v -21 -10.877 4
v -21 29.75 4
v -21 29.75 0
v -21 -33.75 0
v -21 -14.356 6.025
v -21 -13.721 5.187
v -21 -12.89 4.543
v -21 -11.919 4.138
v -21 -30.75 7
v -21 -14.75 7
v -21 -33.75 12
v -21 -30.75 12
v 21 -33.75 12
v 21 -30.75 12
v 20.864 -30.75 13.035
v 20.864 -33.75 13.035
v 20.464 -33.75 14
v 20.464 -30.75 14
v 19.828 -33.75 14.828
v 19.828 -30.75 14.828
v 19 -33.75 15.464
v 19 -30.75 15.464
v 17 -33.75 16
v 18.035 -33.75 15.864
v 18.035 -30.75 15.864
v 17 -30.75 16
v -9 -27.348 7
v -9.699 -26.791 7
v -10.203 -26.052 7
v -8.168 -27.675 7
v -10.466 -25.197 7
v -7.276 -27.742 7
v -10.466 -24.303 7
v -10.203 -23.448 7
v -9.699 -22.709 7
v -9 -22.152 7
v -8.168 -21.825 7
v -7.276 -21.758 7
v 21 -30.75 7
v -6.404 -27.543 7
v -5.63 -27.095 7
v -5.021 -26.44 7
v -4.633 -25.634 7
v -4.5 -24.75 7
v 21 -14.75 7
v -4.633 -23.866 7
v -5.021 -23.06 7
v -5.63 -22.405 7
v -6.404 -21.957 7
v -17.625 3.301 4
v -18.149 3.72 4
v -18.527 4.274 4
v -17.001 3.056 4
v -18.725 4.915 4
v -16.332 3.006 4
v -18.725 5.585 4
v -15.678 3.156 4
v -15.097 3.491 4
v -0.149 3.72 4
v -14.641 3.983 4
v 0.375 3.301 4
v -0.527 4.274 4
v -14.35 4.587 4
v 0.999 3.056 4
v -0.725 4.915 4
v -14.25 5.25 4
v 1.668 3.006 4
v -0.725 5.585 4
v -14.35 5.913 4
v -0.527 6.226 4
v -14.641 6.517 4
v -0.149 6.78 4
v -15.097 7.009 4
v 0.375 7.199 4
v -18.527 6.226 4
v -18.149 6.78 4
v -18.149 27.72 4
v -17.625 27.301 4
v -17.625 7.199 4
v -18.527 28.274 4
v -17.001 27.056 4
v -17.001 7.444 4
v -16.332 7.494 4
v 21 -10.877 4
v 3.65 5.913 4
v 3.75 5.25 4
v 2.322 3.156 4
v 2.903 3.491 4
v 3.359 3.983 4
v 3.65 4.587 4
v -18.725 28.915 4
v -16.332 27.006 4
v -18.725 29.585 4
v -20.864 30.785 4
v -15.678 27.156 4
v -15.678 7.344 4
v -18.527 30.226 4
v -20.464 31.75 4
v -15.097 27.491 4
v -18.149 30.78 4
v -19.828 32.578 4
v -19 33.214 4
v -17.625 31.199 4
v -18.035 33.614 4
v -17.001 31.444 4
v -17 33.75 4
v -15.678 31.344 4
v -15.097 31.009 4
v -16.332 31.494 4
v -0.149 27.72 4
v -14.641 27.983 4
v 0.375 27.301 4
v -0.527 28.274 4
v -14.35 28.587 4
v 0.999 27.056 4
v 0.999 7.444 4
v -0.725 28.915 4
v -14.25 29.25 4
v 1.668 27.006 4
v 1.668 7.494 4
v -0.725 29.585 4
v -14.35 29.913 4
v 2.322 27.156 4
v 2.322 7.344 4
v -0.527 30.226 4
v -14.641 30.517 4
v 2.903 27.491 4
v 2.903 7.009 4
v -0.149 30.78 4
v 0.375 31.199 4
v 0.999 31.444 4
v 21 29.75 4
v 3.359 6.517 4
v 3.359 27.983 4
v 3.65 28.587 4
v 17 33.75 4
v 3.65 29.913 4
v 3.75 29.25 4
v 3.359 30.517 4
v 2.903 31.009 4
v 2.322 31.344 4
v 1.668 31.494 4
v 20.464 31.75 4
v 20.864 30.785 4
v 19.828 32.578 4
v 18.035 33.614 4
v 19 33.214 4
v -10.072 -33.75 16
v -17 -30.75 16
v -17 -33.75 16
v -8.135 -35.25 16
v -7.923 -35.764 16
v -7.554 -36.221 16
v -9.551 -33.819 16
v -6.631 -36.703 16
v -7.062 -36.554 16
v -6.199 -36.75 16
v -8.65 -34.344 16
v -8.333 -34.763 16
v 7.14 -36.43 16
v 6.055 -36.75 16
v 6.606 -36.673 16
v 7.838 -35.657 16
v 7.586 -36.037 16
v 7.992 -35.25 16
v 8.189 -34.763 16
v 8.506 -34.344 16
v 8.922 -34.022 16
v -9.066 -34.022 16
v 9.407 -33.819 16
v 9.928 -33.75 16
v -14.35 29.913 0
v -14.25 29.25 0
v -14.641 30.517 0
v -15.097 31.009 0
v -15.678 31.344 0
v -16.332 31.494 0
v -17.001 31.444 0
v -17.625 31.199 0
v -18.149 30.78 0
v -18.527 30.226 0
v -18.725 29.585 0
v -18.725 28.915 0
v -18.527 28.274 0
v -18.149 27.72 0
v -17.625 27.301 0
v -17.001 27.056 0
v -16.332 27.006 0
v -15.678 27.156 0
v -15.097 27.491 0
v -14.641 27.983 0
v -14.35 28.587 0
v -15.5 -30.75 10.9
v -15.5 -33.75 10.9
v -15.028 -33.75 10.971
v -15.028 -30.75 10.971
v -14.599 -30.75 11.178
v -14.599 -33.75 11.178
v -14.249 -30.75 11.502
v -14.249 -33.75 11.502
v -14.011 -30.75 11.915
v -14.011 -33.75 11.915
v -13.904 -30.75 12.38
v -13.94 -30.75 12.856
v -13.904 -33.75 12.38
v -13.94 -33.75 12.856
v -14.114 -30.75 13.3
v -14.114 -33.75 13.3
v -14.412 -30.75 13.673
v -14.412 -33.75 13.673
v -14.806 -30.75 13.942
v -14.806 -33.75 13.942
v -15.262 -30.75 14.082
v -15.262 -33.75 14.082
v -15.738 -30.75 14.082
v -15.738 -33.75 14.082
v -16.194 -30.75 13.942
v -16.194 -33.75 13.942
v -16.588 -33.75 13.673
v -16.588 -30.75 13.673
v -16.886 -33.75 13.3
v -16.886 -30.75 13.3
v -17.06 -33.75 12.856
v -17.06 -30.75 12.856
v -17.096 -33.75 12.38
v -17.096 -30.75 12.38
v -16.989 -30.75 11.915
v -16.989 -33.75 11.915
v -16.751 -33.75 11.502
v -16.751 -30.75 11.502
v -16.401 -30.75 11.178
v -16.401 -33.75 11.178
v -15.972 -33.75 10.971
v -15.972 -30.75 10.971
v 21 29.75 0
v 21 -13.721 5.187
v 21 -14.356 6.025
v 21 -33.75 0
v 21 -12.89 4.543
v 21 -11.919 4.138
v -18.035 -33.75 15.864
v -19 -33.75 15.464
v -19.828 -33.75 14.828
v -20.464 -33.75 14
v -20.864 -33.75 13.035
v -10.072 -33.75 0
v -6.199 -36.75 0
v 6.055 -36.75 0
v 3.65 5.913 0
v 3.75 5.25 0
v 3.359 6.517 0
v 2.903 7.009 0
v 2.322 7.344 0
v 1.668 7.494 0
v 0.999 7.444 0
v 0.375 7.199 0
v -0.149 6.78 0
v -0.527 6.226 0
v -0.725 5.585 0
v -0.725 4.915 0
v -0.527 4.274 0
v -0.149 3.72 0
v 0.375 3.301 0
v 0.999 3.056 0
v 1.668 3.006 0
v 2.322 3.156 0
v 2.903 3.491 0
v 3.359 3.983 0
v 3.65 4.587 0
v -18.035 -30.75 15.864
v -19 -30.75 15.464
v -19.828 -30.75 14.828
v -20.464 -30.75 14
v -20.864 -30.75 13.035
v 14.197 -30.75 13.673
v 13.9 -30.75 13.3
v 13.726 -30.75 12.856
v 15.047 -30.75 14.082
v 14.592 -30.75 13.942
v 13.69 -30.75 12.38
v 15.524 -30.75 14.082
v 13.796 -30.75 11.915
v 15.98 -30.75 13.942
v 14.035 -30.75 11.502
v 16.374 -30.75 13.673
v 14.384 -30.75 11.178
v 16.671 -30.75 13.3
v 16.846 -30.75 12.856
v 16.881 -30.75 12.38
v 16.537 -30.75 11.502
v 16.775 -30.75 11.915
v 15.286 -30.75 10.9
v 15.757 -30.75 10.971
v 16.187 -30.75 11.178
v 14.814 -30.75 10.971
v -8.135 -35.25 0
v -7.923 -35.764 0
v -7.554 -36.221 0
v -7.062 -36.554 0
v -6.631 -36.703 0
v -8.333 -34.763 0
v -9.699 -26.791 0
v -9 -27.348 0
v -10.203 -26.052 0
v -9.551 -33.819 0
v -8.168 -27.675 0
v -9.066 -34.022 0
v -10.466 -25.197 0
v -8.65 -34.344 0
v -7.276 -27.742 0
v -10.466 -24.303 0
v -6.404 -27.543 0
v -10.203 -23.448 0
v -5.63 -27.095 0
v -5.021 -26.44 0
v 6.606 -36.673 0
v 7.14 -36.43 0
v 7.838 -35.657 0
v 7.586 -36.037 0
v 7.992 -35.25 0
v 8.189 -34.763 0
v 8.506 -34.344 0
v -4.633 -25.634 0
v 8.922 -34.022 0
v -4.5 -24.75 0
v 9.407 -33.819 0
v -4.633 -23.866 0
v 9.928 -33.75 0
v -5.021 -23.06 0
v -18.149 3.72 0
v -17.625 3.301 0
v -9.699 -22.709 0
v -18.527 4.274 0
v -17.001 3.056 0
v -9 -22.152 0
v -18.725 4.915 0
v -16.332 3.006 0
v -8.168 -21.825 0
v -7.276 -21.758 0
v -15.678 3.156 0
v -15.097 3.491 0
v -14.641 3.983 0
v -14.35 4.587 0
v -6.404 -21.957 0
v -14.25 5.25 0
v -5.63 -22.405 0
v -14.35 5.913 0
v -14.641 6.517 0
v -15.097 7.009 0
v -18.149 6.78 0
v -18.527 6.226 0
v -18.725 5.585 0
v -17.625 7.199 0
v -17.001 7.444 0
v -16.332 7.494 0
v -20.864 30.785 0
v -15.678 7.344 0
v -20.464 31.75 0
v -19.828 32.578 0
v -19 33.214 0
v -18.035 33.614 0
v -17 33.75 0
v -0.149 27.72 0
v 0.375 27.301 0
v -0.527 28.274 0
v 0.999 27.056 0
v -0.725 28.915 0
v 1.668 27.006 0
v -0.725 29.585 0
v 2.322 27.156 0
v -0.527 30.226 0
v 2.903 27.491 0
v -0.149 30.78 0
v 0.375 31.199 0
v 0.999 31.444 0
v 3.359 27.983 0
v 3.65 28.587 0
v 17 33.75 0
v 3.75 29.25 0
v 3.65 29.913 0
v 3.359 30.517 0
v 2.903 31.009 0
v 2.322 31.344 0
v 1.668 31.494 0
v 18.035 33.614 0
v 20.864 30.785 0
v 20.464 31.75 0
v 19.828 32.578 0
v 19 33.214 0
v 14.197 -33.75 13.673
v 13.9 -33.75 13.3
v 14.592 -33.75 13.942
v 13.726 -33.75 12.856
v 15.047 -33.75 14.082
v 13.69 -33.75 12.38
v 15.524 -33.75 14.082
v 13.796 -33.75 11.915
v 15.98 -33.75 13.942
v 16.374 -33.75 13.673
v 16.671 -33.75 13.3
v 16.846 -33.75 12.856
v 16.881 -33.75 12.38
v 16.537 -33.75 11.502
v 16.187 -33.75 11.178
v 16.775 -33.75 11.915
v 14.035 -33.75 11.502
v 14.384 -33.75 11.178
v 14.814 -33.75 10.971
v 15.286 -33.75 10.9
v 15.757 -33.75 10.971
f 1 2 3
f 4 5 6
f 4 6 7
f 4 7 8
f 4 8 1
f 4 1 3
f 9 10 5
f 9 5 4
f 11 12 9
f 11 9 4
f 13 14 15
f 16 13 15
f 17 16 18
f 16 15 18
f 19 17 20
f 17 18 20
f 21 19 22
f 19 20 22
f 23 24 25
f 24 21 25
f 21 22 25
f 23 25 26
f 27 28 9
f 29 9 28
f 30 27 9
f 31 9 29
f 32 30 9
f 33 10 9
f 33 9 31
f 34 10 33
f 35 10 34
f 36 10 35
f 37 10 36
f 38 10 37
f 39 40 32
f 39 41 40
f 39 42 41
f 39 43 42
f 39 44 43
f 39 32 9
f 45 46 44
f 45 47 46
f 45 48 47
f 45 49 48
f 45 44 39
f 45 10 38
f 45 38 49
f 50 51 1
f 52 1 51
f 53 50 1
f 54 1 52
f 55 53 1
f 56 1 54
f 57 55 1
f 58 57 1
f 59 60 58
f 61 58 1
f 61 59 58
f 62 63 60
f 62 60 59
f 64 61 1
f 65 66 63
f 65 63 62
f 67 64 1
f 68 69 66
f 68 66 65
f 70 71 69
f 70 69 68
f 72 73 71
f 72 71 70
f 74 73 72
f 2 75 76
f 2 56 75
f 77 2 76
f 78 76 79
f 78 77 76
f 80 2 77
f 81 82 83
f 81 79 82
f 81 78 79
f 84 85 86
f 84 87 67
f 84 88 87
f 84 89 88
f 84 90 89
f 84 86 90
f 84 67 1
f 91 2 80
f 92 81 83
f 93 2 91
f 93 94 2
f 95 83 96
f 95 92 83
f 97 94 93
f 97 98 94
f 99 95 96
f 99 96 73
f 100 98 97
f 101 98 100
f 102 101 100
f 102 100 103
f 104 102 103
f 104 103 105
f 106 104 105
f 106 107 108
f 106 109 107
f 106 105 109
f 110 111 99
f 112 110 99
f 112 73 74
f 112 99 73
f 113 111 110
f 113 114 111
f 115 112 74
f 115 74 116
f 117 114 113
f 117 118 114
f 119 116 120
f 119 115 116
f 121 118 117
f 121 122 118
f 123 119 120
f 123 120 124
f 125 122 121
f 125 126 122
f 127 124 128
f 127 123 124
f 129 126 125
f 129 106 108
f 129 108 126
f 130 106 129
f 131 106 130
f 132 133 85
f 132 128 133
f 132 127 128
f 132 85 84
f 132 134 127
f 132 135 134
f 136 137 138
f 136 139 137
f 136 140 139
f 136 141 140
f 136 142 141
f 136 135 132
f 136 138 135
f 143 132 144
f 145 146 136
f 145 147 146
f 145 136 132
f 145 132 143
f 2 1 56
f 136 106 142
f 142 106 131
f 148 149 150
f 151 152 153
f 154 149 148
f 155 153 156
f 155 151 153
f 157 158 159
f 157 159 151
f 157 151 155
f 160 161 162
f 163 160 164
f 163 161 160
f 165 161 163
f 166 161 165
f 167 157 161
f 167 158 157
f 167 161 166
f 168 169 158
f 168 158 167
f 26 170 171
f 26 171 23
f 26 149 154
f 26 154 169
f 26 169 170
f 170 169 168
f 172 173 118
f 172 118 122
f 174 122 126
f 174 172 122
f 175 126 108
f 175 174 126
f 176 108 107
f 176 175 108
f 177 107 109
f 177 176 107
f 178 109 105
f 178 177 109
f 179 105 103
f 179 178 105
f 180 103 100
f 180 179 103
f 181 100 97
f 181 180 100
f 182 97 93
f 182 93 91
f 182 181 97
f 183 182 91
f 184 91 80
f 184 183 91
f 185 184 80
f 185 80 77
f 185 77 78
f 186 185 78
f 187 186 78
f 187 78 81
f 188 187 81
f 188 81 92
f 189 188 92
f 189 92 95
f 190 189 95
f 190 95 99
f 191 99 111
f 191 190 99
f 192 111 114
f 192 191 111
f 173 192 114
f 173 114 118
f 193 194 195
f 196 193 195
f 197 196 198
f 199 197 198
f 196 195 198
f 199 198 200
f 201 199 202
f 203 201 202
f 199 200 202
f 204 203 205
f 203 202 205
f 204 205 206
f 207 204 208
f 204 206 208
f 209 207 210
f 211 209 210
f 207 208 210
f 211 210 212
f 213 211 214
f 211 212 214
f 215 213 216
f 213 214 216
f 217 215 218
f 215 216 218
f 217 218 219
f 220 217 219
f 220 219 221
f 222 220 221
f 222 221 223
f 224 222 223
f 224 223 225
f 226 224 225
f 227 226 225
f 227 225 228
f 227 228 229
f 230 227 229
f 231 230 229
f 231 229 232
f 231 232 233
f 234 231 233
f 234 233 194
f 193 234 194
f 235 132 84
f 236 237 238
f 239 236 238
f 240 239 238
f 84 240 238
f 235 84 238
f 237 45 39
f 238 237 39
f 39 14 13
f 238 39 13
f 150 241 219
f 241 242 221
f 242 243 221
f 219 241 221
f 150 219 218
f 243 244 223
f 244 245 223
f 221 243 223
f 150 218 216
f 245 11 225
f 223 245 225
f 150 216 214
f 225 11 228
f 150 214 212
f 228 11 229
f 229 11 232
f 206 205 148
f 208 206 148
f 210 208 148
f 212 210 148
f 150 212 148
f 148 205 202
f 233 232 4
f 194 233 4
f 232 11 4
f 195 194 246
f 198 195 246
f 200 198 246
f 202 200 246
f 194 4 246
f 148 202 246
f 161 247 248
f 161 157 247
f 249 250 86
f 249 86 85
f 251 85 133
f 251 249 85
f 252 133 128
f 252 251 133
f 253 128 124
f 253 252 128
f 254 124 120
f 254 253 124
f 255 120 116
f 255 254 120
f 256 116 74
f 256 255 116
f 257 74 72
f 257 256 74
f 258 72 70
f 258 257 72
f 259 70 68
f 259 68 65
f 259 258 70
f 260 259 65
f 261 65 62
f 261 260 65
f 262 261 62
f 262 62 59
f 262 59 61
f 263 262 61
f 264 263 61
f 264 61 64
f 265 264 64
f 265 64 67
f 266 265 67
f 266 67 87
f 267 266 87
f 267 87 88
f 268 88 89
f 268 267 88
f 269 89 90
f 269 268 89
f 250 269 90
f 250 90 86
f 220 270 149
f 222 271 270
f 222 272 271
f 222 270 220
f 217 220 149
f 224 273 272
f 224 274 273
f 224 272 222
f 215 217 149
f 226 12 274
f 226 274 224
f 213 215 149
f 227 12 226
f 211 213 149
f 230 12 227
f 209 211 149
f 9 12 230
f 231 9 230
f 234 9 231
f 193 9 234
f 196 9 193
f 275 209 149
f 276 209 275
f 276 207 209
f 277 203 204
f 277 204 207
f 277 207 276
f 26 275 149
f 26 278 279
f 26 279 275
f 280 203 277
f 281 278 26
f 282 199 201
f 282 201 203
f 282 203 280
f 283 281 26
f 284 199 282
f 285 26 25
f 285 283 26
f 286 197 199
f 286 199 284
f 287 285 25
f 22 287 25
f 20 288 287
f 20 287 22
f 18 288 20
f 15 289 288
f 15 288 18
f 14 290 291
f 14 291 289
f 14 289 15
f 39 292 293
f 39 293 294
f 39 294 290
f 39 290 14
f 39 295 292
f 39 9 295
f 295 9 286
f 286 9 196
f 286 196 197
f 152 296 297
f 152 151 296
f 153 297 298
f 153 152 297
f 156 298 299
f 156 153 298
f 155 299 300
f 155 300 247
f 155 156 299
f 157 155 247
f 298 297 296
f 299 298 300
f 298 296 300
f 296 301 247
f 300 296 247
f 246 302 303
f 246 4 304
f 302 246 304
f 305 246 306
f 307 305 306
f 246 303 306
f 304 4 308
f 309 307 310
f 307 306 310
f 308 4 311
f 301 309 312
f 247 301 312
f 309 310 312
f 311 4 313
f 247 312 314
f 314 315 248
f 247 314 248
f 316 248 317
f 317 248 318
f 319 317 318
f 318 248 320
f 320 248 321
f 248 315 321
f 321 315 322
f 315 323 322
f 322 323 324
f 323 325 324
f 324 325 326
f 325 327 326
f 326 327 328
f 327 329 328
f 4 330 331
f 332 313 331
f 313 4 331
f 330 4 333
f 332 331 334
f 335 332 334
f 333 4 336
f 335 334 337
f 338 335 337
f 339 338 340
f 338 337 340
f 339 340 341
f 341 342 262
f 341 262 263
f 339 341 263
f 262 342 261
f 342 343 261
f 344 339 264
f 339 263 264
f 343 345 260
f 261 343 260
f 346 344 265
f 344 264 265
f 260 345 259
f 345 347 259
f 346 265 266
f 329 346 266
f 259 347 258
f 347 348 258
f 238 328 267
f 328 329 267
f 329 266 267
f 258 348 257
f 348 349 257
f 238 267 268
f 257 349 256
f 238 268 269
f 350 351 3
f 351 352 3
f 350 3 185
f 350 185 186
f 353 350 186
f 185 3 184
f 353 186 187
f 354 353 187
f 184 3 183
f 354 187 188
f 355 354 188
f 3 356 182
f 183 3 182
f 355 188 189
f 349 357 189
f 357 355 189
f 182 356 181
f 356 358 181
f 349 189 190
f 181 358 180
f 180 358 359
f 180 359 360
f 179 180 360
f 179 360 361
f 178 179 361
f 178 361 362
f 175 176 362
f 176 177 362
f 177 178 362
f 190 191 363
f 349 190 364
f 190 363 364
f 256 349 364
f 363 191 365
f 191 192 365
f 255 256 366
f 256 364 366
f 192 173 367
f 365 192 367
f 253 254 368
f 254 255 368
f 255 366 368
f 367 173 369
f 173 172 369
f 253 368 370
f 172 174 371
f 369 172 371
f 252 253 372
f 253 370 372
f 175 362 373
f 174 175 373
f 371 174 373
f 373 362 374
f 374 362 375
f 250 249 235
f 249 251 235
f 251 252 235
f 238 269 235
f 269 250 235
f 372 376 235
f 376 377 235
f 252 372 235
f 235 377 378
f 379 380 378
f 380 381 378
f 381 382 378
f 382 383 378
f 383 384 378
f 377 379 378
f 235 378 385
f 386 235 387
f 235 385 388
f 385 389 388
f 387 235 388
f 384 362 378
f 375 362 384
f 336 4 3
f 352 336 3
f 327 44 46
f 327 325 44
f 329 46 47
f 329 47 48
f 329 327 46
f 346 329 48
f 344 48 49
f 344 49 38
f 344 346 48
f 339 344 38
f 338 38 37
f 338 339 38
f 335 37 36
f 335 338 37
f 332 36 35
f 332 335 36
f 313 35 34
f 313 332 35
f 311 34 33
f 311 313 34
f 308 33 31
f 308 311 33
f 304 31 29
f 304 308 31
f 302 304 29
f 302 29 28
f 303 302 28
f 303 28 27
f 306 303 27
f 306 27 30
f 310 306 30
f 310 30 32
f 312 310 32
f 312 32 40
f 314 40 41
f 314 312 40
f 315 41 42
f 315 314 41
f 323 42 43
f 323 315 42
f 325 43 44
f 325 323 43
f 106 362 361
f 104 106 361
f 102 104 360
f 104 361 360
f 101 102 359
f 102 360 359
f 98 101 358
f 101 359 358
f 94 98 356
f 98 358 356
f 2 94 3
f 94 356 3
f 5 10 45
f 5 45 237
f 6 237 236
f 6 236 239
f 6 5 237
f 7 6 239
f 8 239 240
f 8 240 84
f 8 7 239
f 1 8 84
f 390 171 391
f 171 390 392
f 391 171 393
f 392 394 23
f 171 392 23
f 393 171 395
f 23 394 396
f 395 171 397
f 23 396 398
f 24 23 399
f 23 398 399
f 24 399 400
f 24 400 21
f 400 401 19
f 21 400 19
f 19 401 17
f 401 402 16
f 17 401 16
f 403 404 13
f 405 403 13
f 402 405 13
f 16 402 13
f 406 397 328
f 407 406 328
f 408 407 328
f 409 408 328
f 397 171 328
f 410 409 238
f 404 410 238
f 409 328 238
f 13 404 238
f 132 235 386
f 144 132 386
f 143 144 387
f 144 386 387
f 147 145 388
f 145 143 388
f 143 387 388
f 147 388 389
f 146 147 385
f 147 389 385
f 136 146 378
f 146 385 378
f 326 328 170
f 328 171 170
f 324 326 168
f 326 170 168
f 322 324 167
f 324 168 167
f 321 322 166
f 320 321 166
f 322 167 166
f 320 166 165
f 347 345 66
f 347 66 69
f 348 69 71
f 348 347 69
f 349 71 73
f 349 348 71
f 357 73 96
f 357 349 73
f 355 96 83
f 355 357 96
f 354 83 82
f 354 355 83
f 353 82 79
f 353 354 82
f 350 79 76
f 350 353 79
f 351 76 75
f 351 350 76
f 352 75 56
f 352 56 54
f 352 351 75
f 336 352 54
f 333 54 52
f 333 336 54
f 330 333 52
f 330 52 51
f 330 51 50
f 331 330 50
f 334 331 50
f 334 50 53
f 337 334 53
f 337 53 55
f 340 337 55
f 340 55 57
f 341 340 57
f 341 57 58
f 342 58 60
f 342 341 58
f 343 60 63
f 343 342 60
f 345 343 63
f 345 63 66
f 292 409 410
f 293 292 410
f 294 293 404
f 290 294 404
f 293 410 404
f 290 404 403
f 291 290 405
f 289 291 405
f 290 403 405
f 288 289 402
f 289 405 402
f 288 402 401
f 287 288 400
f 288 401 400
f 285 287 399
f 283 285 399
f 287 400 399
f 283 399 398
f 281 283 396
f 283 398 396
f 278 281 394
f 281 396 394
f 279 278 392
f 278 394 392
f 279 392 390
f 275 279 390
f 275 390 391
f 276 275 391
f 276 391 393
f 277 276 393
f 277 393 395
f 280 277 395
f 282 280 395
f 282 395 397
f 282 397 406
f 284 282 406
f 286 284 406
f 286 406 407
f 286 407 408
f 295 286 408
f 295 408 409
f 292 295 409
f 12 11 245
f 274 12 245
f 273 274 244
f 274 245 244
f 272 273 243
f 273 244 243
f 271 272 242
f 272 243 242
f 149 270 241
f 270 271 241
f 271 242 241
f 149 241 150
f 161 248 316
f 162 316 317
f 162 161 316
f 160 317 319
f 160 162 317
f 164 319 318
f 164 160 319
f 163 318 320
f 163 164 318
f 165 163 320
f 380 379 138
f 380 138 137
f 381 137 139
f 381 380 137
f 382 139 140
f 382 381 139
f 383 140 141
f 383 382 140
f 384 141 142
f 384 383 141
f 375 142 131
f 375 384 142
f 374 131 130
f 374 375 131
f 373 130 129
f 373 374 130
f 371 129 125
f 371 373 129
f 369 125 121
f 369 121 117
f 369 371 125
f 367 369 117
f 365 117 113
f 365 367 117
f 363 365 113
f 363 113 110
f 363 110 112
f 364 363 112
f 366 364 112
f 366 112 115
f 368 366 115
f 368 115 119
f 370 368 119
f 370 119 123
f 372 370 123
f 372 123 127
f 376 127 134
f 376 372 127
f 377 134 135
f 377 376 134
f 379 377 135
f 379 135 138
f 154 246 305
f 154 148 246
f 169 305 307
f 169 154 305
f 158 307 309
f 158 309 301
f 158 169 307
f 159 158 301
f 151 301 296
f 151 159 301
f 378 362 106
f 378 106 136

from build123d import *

# Parameters (mm, degrees)
SKETCH1_W           = 42
SKETCH1_H           = 67.5
SKETCH1_R           = 3
SKETCH1_R_2         = 2.25
BOSS_EXTRUDE1_DEPTH = 4
SKETCH2_W           = 42
SKETCH2_H           = 3
BOSS_EXTRUDE2_DEPTH = 12
SKETCH3_W           = 42
SKETCH3_H           = 16
SKETCH3_R           = 3
BOSS_EXTRUDE3_DEPTH = 3
CUT_EXTRUDE1_REACH  = 74.479
SKETCH4_R           = 1.6
FILLET1_R           = 4
SKETCH5_W           = 16
SKETCH5_H           = 16
BOSS_EXTRUDE4_DEPTH = 3
FILLET3_R           = 2
FILLET4_R           = 2


with BuildPart() as part:
    # Sketch1 → Boss-Extrude1 (new body)
    with BuildSketch(Plane.XY):
        Rectangle(SKETCH1_W, SKETCH1_H)
        with Locations((-7.5, -24.75)):
            Circle(SKETCH1_R, mode=Mode.SUBTRACT)
        with Locations((1.5, 29.25)):
            Circle(SKETCH1_R_2, mode=Mode.SUBTRACT)
        with Locations((-16.5, 29.25)):
            Circle(SKETCH1_R_2, mode=Mode.SUBTRACT)
        with Locations((1.5, 5.25)):
            Circle(SKETCH1_R_2, mode=Mode.SUBTRACT)
        with Locations((-16.5, 5.25)):
            Circle(SKETCH1_R_2, mode=Mode.SUBTRACT)
    extrude(amount=BOSS_EXTRUDE1_DEPTH)

    # Sketch2 → Boss-Extrude2 (add)
    with BuildSketch(Plane.XY.offset(4)):
        with Locations((0, -32.25)):
            Rectangle(SKETCH2_W, SKETCH2_H)
    extrude(amount=BOSS_EXTRUDE2_DEPTH)

    # Sketch3 → Boss-Extrude3 (add)
    with BuildSketch(Plane.XY.offset(4)):
        with Locations((0, -22.75)):
            Rectangle(SKETCH3_W, SKETCH3_H)
        with Locations((-7.5, -24.75)):
            Circle(SKETCH3_R, mode=Mode.SUBTRACT)
    extrude(amount=BOSS_EXTRUDE3_DEPTH)

    # Sketch4 → Cut-Extrude1 (cut, up to next)
    with BuildSketch(Plane.XZ.offset(33.75), mode=Mode.PRIVATE) as cut_extrude1_sk1:
        with Locations(Location((-15.5, 12.5, 0), (0, 0, 270))):
            Circle(SKETCH4_R)
    cut_extrude1_tool1 = extrude(cut_extrude1_sk1.sketch, amount=-CUT_EXTRUDE1_REACH, mode=Mode.PRIVATE) & part.part
    # Sketch4 → Cut-Extrude1 (cut, up to next)
    with BuildSketch(Plane.XZ.offset(33.75), mode=Mode.PRIVATE) as cut_extrude1_sk2:
        with Locations(Location((15.285724533, 12.5, 0), (0, 0, 270))):
            Circle(SKETCH4_R)
    cut_extrude1_tool2 = extrude(cut_extrude1_sk2.sketch, amount=-CUT_EXTRUDE1_REACH, mode=Mode.PRIVATE) & part.part
    add(cut_extrude1_tool1.solids().sort_by_distance((-15.5, -33.75, 12.5))[0], mode=Mode.SUBTRACT)
    add(cut_extrude1_tool2.solids().sort_by_distance((15.285725, -33.75, 12.5))[0], mode=Mode.SUBTRACT)

    # Fillet1
    # the kernel refuses this fillet: 4 mm, written as the material it adds along each edge
    with BuildSketch(Plane(origin=(-21, -14.75, 4), x_dir=(0, 1, 0), z_dir=(1, 0, 0))) as fillet1_piece_1:
        with BuildLine():
            CenterArc((3.872983346, 4), FILLET1_R, 194.477512186, 75.522487814)
            Line((0, 3), (0, 0))
            Line((0, 0), (3.872983346, 0))
        make_face()
    extrude(amount=42)
    # the kernel refuses this fillet: 4 mm, written as the material it takes off along each edge
    with BuildSketch(Plane(origin=(21, -20.75, 16), x_dir=(0, 0, -1), z_dir=(0, -1, 0)), Plane(origin=(-21, -43.75, 16), x_dir=(0, 0, -1), z_dir=(0, 1, 0))) as fillet1_2_piece_1:
        with BuildLine():
            CenterArc((FILLET1_R, -FILLET1_R), FILLET1_R, 90, 90)
            Line((0, -FILLET1_R), (0, 0))
            Line((0, 0), (FILLET1_R, 0))
        make_face()
    extrude(amount=23, mode=Mode.SUBTRACT)
    with BuildSketch(Plane(origin=(21, 33.75, -10), x_dir=(-1, 0, 0), z_dir=(0, 0, 1))) as fillet1_2_piece_2:
        with BuildLine():
            CenterArc((FILLET1_R, FILLET1_R), FILLET1_R, 180, 90)
            Line((0, FILLET1_R), (0, 0))
            Line((0, 0), (FILLET1_R, 0))
        make_face()
    extrude(amount=24, mode=Mode.SUBTRACT)
    with BuildSketch(Plane(origin=(-21, 33.75, -10), x_dir=(1, 0, 0), z_dir=(0, 0, 1))) as fillet1_2_piece_3:
        with BuildLine():
            CenterArc((FILLET1_R, -FILLET1_R), FILLET1_R, 90, 90)
            Line((0, -FILLET1_R), (0, 0))
            Line((0, 0), (FILLET1_R, 0))
        make_face()
    extrude(amount=24, mode=Mode.SUBTRACT)

    # Sketch5 → Boss-Extrude4 (add)
    with BuildSketch(Plane.XZ.offset(33.75)):
        with Locations((-0.071835854, 8)):
            Rectangle(SKETCH5_W, SKETCH5_H)
    extrude(amount=BOSS_EXTRUDE4_DEPTH)

    # Fillet3
    fillet3_edges = [part.edges().sort_by_distance(p)[0] for p in [
        (-8.071835854, -33.75, 8),
        (7.928164146, -33.75, 8),
    ]]
    fillet(fillet3_edges, radius=FILLET3_R)

    # Fillet4
    fillet4_edges = [part.edges().sort_by_distance(p)[0] for p in [
        (7.928164146, -36.75, 8),
        (-8.071835854, -36.75, 8),
    ]]
    fillet(fillet4_edges, radius=FILLET4_R)


solid = part.part
